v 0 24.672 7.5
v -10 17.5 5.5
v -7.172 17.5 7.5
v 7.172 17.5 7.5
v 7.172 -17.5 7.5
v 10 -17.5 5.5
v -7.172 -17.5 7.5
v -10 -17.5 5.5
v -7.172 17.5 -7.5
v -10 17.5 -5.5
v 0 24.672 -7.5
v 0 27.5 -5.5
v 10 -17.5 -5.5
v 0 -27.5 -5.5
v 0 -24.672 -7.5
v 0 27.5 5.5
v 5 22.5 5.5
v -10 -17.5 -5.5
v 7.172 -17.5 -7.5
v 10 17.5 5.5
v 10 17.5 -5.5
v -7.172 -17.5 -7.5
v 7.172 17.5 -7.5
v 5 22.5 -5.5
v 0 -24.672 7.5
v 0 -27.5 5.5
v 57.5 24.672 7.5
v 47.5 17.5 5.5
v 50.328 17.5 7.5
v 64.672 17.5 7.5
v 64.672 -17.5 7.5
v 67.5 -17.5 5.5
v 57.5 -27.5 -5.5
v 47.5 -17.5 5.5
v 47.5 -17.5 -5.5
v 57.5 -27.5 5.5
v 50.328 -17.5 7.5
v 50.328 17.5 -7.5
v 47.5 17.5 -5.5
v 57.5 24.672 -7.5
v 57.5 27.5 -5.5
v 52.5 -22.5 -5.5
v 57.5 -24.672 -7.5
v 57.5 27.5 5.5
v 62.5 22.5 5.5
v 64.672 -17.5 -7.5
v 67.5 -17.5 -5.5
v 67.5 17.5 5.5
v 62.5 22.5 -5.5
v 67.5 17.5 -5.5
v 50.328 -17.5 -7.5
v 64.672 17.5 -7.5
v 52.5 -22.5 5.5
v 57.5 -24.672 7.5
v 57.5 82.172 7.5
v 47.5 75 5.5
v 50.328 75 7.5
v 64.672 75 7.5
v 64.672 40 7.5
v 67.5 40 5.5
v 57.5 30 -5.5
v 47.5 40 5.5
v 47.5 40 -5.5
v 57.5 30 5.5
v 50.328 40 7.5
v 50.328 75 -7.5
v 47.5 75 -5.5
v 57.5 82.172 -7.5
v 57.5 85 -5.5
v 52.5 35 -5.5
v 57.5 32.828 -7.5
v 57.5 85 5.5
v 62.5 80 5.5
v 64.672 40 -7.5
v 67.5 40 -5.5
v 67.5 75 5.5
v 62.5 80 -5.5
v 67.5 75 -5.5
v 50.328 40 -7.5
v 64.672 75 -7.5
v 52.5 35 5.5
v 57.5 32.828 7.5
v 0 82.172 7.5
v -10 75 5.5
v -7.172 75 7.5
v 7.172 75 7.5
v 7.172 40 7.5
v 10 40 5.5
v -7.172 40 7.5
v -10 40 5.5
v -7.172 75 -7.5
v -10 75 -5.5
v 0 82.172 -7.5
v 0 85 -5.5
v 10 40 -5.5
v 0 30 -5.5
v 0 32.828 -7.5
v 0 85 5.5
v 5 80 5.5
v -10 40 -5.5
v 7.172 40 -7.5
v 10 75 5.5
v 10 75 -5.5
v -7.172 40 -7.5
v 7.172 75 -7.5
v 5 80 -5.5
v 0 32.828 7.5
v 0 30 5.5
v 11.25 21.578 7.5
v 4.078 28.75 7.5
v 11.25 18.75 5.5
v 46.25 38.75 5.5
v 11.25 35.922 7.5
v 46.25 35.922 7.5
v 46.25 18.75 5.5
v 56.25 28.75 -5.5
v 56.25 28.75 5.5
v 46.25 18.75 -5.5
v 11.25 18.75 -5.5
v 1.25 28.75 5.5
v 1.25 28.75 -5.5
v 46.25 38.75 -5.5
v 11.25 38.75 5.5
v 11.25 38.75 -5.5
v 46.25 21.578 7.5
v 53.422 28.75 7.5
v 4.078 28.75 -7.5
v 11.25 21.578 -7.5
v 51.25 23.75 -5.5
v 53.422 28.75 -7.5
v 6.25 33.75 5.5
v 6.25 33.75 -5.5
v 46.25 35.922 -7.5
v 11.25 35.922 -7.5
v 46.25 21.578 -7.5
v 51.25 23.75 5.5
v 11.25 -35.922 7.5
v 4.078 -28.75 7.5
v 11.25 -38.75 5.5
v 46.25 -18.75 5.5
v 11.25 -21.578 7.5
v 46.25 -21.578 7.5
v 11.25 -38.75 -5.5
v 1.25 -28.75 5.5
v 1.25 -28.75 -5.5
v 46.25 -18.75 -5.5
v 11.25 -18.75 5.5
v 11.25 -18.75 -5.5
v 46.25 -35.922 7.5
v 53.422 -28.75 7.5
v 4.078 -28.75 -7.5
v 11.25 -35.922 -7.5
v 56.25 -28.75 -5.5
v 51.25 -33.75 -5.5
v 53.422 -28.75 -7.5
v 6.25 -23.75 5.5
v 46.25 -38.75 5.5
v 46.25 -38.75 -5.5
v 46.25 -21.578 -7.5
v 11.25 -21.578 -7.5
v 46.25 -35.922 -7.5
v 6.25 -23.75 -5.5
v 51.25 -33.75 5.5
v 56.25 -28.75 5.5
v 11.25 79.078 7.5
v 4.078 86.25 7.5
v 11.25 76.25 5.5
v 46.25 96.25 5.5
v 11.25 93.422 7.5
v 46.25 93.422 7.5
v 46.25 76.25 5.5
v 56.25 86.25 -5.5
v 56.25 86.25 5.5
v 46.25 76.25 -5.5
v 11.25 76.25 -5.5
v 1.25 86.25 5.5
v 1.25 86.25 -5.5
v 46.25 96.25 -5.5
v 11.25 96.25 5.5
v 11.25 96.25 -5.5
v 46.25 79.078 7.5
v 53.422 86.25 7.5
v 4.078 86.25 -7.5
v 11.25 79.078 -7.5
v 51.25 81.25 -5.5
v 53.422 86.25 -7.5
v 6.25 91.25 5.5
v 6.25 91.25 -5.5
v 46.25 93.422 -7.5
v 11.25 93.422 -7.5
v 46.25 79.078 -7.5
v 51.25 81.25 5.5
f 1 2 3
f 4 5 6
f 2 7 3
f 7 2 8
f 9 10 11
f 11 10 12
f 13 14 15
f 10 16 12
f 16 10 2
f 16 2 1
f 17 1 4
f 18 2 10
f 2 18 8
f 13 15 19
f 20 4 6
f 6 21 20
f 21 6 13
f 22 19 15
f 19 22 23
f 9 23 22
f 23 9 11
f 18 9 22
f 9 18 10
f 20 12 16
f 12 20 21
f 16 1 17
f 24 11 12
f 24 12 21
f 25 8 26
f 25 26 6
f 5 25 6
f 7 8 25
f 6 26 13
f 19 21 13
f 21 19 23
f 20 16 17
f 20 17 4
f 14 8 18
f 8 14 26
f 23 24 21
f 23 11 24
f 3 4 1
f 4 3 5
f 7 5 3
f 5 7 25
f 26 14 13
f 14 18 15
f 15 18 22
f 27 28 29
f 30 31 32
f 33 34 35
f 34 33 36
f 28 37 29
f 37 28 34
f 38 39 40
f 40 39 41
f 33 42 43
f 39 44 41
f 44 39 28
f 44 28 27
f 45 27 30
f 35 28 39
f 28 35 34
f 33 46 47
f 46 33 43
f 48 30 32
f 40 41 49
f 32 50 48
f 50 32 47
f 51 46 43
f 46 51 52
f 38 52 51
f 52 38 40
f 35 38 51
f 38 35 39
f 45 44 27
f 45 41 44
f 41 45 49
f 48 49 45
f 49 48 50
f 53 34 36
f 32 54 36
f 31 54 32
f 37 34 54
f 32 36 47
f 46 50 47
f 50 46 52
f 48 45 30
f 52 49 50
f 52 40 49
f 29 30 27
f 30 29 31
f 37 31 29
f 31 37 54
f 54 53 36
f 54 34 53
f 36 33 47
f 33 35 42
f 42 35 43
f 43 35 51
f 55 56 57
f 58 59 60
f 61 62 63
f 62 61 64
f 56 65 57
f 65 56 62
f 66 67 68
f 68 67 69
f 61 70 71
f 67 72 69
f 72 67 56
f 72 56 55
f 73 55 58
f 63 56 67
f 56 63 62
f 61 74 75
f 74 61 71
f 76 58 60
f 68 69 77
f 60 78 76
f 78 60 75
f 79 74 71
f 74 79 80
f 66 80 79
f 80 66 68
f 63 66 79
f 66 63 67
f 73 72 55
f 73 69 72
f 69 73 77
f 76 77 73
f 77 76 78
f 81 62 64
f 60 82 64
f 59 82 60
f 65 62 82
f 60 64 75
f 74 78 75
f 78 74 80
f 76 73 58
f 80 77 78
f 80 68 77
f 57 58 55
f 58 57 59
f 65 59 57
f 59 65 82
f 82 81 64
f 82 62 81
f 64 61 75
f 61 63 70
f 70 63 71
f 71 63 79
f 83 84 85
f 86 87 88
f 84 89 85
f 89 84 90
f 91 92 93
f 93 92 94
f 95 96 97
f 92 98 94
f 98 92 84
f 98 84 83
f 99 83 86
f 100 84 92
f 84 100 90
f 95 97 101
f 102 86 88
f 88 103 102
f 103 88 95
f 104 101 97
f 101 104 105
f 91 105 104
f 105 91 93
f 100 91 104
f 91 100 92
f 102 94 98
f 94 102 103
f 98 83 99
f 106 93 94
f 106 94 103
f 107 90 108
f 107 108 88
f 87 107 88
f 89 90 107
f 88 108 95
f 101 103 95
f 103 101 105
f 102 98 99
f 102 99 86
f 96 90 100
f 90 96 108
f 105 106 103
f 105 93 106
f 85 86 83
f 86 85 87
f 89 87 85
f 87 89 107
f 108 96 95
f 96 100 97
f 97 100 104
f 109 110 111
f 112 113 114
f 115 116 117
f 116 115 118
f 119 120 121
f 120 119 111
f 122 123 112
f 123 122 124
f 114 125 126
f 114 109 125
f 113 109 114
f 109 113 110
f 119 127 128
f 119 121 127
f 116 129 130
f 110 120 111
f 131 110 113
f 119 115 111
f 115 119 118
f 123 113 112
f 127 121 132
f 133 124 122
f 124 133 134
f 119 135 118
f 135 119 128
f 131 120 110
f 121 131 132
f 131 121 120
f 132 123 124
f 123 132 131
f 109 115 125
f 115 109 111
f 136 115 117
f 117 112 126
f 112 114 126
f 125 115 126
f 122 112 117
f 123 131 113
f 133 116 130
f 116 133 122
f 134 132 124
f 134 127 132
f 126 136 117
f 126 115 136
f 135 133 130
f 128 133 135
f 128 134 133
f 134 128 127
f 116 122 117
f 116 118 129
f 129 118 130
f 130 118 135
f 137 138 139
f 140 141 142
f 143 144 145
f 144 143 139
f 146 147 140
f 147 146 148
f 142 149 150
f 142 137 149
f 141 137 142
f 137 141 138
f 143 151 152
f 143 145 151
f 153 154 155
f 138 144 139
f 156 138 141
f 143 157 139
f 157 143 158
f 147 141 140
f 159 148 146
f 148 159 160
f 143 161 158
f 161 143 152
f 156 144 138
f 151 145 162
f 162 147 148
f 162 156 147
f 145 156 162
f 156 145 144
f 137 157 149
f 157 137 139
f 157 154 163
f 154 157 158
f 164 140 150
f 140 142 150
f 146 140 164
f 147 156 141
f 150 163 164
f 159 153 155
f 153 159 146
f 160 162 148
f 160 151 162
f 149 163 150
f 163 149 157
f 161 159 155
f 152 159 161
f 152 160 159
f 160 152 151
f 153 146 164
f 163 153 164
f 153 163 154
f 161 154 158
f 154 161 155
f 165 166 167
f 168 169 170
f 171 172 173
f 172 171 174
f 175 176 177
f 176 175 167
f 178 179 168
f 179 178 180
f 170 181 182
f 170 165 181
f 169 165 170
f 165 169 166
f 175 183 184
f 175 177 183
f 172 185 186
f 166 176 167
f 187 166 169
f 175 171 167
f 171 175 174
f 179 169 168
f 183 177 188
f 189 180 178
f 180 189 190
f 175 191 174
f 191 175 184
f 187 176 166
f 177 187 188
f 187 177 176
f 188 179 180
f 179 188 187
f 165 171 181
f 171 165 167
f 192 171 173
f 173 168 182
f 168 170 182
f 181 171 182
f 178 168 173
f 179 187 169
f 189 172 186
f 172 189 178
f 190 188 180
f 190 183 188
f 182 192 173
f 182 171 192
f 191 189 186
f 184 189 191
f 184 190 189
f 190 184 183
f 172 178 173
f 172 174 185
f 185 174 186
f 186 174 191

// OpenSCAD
segment = [20, 55, 15];

 cijfer();;
//less(segment);

module cijfer() {
   margin = 2.5;
   segment(segment);
   translate([segment.y + margin, 0, 0]) segment(segment);
   translate([segment.y + margin, segment.y + margin, 0]) segment(segment);
   translate([0, segment.y + margin, 0]) segment(segment); 
   translate ([segment.y + margin, segment.y + margin, 0] / 2) rotate([0, 0, 90]) segment(segment);
   translate ([segment.y + margin, -segment.y - margin, 0] / 2) rotate([0, 0, 90]) segment(segment);
   translate ([segment.y + margin, (segment.y + margin) * 3, 0] / 2) rotate([0, 0, 90]) segment(segment);
}


module segment(cube = [10, 30, 10], center = true) {

    
    x = cube.x / cos(45) / 2;
    hull() {
//        less(cube - [10, 10, 0]);
        for(i = [-1, 1])
            translate([0, cube.y - sqrt(2) * x, 0] / 2 * i)
                rotate([0, 0, 45])
                    less ([x, x, cube.z]);
    }
}

module less(cube = [10, 10, 10]) {
    kant(cube);
    mirror([-1, 0,  0]) kant(cube);
    mirror([ 0, 0, -1]) kant(cube);
    rotate([ 0, 180, 0]) kant(cube);
    mirror([0, 1, 0]) kant(cube);
    mirror([-1, 0, 0]) mirror([0, -1, -0]) kant(cube);
    mirror([0, 0, -1]) mirror([0, -1, -0]) kant(cube);
    rotate([0, 180, 0]) mirror([0, -1, -0]) kant(cube);
}


module kant(cube = [10, 30, 20], hoek = 45) {
    marge = 1;
    mirror([1,0,0])
    translate([0, -cube.y / 2, 0])
        difference() {
            cube([cube.x, cube.y, cube.z] / 2, center = false);
            translate([ -cube.x / cos(hoek) / 4 + cube.x / 2 - marge,
                         0,
                         cube.x / sin(hoek) / 4 + cube.z / 2 - marge])
                rotate([0, hoek, 0])
                    cube(cube, center = false);
            translate([ 0, 
                        -cube.z / cos(hoek) / 4  + marge,
                       -cube.z / sin(hoek) / 4  + cube.z / 2 - marge])
                rotate([hoek, 0, 0])
                    translate([-1, 0, 0])
                        cube(cube + [2, 0, 0], center = false);

        }
}
